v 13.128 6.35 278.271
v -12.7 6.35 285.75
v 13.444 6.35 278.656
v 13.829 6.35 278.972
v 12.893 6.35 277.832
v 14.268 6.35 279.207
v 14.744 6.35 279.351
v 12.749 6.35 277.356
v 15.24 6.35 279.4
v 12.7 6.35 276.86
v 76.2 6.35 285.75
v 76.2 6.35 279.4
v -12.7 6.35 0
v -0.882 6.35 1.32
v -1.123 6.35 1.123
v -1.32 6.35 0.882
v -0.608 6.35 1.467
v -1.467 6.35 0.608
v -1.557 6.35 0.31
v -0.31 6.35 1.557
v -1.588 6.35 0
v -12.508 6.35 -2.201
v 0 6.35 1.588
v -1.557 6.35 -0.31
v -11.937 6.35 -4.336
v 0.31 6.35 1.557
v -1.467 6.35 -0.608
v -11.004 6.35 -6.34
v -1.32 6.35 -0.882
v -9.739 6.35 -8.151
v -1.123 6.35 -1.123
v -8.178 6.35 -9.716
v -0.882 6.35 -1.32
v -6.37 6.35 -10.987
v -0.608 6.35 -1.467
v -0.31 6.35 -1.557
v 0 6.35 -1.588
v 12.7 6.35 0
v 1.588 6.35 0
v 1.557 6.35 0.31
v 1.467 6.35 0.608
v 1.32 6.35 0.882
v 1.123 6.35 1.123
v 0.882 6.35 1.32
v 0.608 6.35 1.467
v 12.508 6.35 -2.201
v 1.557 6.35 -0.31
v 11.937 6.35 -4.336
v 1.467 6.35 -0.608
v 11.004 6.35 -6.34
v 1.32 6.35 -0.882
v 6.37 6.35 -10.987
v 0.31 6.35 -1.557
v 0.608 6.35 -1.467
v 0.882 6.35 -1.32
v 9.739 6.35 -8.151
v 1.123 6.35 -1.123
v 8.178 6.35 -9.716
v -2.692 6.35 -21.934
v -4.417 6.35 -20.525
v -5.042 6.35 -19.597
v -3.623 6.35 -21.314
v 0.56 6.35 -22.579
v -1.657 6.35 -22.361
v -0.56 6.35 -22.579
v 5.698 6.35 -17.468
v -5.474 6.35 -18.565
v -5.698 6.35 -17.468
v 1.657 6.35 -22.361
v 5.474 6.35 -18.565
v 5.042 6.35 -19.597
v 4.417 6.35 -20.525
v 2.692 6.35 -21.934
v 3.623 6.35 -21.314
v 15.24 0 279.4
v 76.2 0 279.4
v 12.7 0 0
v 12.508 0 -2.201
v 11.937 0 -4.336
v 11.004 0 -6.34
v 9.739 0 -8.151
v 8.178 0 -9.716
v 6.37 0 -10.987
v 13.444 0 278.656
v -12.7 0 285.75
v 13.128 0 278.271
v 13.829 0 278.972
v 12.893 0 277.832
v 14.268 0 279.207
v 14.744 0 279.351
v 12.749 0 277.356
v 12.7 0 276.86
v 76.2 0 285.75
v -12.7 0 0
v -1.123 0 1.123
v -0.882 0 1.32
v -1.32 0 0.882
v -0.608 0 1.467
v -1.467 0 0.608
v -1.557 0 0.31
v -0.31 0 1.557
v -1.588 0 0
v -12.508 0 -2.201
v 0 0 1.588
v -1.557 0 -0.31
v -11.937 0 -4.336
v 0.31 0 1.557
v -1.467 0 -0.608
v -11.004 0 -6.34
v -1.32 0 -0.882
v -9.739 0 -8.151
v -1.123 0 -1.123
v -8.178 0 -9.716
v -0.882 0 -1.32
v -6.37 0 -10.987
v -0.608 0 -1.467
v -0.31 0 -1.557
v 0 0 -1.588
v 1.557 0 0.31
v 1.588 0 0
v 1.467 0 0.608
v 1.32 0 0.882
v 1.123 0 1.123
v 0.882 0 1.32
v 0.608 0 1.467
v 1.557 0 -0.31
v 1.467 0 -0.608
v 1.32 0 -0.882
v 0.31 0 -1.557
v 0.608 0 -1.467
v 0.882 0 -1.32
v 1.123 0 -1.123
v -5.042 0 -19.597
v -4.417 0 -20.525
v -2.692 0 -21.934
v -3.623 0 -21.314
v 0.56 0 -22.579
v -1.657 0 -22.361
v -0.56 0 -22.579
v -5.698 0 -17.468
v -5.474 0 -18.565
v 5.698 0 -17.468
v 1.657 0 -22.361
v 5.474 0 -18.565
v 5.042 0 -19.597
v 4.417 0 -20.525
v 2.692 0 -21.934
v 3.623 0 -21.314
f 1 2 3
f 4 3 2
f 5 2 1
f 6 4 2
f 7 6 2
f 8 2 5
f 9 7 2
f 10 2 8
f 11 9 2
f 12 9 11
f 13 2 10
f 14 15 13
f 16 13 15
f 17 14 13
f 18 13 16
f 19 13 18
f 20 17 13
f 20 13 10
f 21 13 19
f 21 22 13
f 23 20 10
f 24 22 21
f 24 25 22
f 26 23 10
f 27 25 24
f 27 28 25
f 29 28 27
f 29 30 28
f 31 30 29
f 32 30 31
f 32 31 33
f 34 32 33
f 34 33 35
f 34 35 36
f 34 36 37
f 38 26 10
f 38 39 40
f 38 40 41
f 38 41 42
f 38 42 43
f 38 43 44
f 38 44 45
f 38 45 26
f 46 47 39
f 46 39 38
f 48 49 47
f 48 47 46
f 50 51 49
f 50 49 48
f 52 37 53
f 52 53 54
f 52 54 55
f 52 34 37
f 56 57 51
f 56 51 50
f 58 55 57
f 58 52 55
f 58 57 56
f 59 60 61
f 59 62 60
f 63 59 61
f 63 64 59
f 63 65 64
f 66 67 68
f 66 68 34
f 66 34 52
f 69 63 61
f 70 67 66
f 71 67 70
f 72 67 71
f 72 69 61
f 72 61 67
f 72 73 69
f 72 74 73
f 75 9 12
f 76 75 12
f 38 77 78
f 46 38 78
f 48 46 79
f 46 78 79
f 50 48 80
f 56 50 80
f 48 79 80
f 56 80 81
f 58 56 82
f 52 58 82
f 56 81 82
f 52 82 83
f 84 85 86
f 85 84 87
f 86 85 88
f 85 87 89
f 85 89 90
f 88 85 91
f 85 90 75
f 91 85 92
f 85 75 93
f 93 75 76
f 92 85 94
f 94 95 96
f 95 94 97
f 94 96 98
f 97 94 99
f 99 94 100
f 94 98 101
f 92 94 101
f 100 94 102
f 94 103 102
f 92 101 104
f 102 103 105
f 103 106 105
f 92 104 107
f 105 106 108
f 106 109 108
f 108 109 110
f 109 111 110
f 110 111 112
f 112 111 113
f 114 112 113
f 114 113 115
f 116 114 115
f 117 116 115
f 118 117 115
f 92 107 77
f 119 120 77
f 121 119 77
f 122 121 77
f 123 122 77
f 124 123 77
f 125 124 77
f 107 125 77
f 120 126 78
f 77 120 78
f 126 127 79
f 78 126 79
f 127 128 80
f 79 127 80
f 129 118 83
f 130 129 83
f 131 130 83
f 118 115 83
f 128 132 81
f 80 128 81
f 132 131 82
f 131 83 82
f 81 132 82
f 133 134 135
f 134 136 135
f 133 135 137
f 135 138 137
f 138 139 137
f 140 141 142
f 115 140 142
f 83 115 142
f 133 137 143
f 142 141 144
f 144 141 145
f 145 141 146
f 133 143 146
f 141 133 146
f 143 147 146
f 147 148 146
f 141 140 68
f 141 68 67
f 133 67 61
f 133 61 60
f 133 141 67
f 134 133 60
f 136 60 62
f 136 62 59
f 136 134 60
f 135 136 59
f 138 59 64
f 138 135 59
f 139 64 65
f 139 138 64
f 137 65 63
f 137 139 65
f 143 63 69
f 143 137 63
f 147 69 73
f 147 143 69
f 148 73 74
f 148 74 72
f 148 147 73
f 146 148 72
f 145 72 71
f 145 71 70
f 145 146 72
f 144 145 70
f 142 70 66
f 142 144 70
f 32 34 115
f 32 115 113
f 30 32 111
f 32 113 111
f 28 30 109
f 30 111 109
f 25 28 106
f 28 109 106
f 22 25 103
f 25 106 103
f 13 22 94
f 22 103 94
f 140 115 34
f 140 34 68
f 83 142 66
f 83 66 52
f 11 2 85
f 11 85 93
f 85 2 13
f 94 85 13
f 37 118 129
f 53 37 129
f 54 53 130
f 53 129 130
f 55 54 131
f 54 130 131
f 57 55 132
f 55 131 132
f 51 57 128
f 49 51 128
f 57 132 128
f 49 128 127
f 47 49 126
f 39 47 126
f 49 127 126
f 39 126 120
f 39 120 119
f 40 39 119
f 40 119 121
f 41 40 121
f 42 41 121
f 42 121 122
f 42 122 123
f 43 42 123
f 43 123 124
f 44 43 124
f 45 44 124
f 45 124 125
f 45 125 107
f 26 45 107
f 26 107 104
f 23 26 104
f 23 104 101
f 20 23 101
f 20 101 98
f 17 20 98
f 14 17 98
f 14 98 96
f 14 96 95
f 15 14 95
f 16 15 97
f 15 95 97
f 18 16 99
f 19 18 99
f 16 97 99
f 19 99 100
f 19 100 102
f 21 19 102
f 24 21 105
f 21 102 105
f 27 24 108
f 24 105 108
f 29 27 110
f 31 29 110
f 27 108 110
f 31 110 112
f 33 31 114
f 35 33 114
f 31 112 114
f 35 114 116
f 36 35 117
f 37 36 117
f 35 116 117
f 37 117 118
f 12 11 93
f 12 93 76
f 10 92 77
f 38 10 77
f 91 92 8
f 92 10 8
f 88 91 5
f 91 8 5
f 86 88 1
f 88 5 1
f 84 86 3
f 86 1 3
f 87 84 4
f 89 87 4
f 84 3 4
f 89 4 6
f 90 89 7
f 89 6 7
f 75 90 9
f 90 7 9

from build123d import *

# Parameters (mm, degrees)
BOSS_EXTRUDE1_DEPTH = 6.35
SKETCH2_W           = 88.9
SKETCH2_H           = 6.35
BOSS_EXTRUDE2_DEPTH = 6.35
FILLET1_R           = 2.54
BOSS_EXTRUDE3_DEPTH = 6.35
SKETCH4_R           = 1.5875
CUT_EXTRUDE1_DEPTH  = 296.803693351


with BuildPart() as part:
    # Sketch1 → Boss-Extrude1 (new body)
    with BuildSketch(Plane(origin=(0, 0, 0), x_dir=(1, 0, 0), z_dir=(0, 1, 0))):
        with BuildLine():
            ThreePointArc((12.7, 0), (0, -12.7), (-12.7, 0))
            Line((-12.7, 0), (-12.7, -279.4))
            Line((-12.7, -279.4), (12.7, -279.4))
            Line((12.7, -279.4), (12.7, 0))
        make_face()
        with BuildLine():
            ThreePointArc((12.7, 0), (0, 12.7), (-12.7, 0))
            Line((-12.7, 0), (12.7, 0))
        make_face()
        with BuildLine():
            Line((12.7, 0), (-12.7, 0))
            ThreePointArc((-12.7, 0), (0, -12.7), (12.7, 0))
        make_face()
    extrude(amount=BOSS_EXTRUDE1_DEPTH)

    # Sketch2 → Boss-Extrude2 (add)
    with BuildSketch(Plane(origin=(0, 6.35, 0), x_dir=(1, 0, 0), z_dir=(0, 1, 0))):
        with Locations((31.75, -282.575)):
            Rectangle(SKETCH2_W, SKETCH2_H)
    extrude(amount=-BOSS_EXTRUDE2_DEPTH)

    # Fillet1
    fillet1_edges = [part.edges().sort_by_distance(p)[0] for p in [
        (12.7, 3.175, 279.4),
    ]]
    fillet(fillet1_edges, radius=FILLET1_R)

    # Sketch3 → Boss-Extrude3 (add)
    with BuildSketch(Plane(origin=(0, 0, 0), x_dir=(-1, 0, 0), z_dir=(0, -1, 0))):
        with BuildLine():
            Line((-7.384124229, 1.213847931), (7.384124229, 1.213847931))
            Line((7.384124229, 1.213847931), (5.698055631, 17.468424552))
            ThreePointArc((5.698055631, 17.468424552), (0, 22.606), (-5.698055631, 17.468424552))
            Line((-5.698055631, 17.468424552), (-7.384124229, 1.213847931))
        make_face()
    extrude(amount=-BOSS_EXTRUDE3_DEPTH)

    # Sketch4 → Cut-Extrude1 (cut, through all)
    with BuildSketch(Plane(origin=(0, 0, 0), x_dir=(-1, 0, 0), z_dir=(0, -1, 0))):
        with Locations(Location((0, 0, 0), (0, 0, 90))):
            Circle(SKETCH4_R)
    extrude(amount=-CUT_EXTRUDE1_DEPTH, mode=Mode.SUBTRACT)


solid = part.part
